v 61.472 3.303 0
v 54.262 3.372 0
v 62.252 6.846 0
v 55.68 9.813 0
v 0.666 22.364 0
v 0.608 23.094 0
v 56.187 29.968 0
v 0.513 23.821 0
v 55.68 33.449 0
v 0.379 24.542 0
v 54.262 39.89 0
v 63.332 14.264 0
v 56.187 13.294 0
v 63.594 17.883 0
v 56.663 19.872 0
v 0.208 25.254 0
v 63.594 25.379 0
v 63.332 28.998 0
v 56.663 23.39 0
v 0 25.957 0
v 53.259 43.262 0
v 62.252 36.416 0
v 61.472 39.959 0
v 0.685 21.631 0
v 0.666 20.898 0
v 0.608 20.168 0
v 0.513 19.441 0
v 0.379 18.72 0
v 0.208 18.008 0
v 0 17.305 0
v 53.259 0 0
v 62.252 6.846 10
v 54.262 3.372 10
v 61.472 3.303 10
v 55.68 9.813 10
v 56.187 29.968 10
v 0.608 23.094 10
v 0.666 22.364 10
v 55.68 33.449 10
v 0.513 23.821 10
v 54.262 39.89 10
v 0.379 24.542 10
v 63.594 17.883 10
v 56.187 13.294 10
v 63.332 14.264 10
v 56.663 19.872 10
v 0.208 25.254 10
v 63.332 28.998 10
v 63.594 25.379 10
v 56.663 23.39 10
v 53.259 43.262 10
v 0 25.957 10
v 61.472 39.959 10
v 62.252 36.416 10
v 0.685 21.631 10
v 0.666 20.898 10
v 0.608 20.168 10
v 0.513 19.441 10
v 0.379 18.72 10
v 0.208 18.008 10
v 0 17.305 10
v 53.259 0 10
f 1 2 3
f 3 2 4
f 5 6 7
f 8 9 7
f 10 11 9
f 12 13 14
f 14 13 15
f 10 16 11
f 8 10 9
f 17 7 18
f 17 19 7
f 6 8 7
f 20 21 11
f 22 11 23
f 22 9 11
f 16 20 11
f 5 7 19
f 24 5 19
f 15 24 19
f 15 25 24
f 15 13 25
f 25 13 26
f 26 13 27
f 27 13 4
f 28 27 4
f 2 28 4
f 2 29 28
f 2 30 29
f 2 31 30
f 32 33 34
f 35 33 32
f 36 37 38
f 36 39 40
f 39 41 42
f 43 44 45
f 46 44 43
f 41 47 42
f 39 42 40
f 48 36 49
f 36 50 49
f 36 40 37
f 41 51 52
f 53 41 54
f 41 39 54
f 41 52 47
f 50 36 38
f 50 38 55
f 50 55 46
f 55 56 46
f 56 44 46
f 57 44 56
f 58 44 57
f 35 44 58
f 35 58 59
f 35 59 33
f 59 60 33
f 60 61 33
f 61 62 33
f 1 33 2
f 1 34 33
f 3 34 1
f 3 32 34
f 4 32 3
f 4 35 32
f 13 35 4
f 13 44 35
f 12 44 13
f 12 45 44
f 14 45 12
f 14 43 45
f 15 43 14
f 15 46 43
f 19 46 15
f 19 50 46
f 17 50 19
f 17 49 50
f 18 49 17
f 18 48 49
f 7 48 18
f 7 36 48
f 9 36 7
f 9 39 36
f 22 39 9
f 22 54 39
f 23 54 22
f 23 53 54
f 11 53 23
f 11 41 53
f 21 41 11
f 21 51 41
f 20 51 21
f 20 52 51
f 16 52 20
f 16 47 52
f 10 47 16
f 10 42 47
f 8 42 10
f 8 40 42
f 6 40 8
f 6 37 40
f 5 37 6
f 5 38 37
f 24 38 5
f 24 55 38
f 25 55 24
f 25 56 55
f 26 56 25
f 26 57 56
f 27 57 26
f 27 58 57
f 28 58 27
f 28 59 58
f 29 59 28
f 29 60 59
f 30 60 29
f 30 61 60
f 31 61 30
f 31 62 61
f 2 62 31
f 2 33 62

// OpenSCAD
$fn = 32;

// ----------------------------------------------------------------------
// Gear sector: 4 teeth on 36 degrees
// ----------------------------------------------------------------------

// --- parameters (mm) ---
sector_angle = 36;        // sector angle, degrees
root_r = 70;              // root circle radius
tooth_h = 7;              // tooth height over the root circle
teeth = 4;                // number of teeth on the sector
hub_r = 14;               // hub bore radius
plate_t = 10;             // sector thickness, Z
arc_step = 3;             // sampling step of the root/hub arcs, degrees

tip_r = root_r + tooth_h;  // tip circle radius

profile = [[53.259, 0], [54.262, 3.372], [61.472, 3.303], [62.252, 6.846], [55.68, 9.813], [56.187, 13.294], [63.332, 14.264], [63.594, 17.883], [56.663, 19.872], [56.663, 23.39], [63.594, 25.379], [63.332, 28.998], [56.187, 29.968], [55.68, 33.449], [62.252, 36.416], [61.472, 39.959], [54.262, 39.89], [53.259, 43.262], [0, 25.957], [0.208, 25.254], [0.379, 24.542], [0.513, 23.821], [0.608, 23.094], [0.666, 22.364], [0.685, 21.631], [0.666, 20.898], [0.608, 20.168], [0.513, 19.441], [0.379, 18.72], [0.208, 18.008], [0, 17.305]];  // primary outline, 31 points, counter clockwise

// --- the one profile operation ---
linear_extrude(height = plate_t) polygon(points = profile);
